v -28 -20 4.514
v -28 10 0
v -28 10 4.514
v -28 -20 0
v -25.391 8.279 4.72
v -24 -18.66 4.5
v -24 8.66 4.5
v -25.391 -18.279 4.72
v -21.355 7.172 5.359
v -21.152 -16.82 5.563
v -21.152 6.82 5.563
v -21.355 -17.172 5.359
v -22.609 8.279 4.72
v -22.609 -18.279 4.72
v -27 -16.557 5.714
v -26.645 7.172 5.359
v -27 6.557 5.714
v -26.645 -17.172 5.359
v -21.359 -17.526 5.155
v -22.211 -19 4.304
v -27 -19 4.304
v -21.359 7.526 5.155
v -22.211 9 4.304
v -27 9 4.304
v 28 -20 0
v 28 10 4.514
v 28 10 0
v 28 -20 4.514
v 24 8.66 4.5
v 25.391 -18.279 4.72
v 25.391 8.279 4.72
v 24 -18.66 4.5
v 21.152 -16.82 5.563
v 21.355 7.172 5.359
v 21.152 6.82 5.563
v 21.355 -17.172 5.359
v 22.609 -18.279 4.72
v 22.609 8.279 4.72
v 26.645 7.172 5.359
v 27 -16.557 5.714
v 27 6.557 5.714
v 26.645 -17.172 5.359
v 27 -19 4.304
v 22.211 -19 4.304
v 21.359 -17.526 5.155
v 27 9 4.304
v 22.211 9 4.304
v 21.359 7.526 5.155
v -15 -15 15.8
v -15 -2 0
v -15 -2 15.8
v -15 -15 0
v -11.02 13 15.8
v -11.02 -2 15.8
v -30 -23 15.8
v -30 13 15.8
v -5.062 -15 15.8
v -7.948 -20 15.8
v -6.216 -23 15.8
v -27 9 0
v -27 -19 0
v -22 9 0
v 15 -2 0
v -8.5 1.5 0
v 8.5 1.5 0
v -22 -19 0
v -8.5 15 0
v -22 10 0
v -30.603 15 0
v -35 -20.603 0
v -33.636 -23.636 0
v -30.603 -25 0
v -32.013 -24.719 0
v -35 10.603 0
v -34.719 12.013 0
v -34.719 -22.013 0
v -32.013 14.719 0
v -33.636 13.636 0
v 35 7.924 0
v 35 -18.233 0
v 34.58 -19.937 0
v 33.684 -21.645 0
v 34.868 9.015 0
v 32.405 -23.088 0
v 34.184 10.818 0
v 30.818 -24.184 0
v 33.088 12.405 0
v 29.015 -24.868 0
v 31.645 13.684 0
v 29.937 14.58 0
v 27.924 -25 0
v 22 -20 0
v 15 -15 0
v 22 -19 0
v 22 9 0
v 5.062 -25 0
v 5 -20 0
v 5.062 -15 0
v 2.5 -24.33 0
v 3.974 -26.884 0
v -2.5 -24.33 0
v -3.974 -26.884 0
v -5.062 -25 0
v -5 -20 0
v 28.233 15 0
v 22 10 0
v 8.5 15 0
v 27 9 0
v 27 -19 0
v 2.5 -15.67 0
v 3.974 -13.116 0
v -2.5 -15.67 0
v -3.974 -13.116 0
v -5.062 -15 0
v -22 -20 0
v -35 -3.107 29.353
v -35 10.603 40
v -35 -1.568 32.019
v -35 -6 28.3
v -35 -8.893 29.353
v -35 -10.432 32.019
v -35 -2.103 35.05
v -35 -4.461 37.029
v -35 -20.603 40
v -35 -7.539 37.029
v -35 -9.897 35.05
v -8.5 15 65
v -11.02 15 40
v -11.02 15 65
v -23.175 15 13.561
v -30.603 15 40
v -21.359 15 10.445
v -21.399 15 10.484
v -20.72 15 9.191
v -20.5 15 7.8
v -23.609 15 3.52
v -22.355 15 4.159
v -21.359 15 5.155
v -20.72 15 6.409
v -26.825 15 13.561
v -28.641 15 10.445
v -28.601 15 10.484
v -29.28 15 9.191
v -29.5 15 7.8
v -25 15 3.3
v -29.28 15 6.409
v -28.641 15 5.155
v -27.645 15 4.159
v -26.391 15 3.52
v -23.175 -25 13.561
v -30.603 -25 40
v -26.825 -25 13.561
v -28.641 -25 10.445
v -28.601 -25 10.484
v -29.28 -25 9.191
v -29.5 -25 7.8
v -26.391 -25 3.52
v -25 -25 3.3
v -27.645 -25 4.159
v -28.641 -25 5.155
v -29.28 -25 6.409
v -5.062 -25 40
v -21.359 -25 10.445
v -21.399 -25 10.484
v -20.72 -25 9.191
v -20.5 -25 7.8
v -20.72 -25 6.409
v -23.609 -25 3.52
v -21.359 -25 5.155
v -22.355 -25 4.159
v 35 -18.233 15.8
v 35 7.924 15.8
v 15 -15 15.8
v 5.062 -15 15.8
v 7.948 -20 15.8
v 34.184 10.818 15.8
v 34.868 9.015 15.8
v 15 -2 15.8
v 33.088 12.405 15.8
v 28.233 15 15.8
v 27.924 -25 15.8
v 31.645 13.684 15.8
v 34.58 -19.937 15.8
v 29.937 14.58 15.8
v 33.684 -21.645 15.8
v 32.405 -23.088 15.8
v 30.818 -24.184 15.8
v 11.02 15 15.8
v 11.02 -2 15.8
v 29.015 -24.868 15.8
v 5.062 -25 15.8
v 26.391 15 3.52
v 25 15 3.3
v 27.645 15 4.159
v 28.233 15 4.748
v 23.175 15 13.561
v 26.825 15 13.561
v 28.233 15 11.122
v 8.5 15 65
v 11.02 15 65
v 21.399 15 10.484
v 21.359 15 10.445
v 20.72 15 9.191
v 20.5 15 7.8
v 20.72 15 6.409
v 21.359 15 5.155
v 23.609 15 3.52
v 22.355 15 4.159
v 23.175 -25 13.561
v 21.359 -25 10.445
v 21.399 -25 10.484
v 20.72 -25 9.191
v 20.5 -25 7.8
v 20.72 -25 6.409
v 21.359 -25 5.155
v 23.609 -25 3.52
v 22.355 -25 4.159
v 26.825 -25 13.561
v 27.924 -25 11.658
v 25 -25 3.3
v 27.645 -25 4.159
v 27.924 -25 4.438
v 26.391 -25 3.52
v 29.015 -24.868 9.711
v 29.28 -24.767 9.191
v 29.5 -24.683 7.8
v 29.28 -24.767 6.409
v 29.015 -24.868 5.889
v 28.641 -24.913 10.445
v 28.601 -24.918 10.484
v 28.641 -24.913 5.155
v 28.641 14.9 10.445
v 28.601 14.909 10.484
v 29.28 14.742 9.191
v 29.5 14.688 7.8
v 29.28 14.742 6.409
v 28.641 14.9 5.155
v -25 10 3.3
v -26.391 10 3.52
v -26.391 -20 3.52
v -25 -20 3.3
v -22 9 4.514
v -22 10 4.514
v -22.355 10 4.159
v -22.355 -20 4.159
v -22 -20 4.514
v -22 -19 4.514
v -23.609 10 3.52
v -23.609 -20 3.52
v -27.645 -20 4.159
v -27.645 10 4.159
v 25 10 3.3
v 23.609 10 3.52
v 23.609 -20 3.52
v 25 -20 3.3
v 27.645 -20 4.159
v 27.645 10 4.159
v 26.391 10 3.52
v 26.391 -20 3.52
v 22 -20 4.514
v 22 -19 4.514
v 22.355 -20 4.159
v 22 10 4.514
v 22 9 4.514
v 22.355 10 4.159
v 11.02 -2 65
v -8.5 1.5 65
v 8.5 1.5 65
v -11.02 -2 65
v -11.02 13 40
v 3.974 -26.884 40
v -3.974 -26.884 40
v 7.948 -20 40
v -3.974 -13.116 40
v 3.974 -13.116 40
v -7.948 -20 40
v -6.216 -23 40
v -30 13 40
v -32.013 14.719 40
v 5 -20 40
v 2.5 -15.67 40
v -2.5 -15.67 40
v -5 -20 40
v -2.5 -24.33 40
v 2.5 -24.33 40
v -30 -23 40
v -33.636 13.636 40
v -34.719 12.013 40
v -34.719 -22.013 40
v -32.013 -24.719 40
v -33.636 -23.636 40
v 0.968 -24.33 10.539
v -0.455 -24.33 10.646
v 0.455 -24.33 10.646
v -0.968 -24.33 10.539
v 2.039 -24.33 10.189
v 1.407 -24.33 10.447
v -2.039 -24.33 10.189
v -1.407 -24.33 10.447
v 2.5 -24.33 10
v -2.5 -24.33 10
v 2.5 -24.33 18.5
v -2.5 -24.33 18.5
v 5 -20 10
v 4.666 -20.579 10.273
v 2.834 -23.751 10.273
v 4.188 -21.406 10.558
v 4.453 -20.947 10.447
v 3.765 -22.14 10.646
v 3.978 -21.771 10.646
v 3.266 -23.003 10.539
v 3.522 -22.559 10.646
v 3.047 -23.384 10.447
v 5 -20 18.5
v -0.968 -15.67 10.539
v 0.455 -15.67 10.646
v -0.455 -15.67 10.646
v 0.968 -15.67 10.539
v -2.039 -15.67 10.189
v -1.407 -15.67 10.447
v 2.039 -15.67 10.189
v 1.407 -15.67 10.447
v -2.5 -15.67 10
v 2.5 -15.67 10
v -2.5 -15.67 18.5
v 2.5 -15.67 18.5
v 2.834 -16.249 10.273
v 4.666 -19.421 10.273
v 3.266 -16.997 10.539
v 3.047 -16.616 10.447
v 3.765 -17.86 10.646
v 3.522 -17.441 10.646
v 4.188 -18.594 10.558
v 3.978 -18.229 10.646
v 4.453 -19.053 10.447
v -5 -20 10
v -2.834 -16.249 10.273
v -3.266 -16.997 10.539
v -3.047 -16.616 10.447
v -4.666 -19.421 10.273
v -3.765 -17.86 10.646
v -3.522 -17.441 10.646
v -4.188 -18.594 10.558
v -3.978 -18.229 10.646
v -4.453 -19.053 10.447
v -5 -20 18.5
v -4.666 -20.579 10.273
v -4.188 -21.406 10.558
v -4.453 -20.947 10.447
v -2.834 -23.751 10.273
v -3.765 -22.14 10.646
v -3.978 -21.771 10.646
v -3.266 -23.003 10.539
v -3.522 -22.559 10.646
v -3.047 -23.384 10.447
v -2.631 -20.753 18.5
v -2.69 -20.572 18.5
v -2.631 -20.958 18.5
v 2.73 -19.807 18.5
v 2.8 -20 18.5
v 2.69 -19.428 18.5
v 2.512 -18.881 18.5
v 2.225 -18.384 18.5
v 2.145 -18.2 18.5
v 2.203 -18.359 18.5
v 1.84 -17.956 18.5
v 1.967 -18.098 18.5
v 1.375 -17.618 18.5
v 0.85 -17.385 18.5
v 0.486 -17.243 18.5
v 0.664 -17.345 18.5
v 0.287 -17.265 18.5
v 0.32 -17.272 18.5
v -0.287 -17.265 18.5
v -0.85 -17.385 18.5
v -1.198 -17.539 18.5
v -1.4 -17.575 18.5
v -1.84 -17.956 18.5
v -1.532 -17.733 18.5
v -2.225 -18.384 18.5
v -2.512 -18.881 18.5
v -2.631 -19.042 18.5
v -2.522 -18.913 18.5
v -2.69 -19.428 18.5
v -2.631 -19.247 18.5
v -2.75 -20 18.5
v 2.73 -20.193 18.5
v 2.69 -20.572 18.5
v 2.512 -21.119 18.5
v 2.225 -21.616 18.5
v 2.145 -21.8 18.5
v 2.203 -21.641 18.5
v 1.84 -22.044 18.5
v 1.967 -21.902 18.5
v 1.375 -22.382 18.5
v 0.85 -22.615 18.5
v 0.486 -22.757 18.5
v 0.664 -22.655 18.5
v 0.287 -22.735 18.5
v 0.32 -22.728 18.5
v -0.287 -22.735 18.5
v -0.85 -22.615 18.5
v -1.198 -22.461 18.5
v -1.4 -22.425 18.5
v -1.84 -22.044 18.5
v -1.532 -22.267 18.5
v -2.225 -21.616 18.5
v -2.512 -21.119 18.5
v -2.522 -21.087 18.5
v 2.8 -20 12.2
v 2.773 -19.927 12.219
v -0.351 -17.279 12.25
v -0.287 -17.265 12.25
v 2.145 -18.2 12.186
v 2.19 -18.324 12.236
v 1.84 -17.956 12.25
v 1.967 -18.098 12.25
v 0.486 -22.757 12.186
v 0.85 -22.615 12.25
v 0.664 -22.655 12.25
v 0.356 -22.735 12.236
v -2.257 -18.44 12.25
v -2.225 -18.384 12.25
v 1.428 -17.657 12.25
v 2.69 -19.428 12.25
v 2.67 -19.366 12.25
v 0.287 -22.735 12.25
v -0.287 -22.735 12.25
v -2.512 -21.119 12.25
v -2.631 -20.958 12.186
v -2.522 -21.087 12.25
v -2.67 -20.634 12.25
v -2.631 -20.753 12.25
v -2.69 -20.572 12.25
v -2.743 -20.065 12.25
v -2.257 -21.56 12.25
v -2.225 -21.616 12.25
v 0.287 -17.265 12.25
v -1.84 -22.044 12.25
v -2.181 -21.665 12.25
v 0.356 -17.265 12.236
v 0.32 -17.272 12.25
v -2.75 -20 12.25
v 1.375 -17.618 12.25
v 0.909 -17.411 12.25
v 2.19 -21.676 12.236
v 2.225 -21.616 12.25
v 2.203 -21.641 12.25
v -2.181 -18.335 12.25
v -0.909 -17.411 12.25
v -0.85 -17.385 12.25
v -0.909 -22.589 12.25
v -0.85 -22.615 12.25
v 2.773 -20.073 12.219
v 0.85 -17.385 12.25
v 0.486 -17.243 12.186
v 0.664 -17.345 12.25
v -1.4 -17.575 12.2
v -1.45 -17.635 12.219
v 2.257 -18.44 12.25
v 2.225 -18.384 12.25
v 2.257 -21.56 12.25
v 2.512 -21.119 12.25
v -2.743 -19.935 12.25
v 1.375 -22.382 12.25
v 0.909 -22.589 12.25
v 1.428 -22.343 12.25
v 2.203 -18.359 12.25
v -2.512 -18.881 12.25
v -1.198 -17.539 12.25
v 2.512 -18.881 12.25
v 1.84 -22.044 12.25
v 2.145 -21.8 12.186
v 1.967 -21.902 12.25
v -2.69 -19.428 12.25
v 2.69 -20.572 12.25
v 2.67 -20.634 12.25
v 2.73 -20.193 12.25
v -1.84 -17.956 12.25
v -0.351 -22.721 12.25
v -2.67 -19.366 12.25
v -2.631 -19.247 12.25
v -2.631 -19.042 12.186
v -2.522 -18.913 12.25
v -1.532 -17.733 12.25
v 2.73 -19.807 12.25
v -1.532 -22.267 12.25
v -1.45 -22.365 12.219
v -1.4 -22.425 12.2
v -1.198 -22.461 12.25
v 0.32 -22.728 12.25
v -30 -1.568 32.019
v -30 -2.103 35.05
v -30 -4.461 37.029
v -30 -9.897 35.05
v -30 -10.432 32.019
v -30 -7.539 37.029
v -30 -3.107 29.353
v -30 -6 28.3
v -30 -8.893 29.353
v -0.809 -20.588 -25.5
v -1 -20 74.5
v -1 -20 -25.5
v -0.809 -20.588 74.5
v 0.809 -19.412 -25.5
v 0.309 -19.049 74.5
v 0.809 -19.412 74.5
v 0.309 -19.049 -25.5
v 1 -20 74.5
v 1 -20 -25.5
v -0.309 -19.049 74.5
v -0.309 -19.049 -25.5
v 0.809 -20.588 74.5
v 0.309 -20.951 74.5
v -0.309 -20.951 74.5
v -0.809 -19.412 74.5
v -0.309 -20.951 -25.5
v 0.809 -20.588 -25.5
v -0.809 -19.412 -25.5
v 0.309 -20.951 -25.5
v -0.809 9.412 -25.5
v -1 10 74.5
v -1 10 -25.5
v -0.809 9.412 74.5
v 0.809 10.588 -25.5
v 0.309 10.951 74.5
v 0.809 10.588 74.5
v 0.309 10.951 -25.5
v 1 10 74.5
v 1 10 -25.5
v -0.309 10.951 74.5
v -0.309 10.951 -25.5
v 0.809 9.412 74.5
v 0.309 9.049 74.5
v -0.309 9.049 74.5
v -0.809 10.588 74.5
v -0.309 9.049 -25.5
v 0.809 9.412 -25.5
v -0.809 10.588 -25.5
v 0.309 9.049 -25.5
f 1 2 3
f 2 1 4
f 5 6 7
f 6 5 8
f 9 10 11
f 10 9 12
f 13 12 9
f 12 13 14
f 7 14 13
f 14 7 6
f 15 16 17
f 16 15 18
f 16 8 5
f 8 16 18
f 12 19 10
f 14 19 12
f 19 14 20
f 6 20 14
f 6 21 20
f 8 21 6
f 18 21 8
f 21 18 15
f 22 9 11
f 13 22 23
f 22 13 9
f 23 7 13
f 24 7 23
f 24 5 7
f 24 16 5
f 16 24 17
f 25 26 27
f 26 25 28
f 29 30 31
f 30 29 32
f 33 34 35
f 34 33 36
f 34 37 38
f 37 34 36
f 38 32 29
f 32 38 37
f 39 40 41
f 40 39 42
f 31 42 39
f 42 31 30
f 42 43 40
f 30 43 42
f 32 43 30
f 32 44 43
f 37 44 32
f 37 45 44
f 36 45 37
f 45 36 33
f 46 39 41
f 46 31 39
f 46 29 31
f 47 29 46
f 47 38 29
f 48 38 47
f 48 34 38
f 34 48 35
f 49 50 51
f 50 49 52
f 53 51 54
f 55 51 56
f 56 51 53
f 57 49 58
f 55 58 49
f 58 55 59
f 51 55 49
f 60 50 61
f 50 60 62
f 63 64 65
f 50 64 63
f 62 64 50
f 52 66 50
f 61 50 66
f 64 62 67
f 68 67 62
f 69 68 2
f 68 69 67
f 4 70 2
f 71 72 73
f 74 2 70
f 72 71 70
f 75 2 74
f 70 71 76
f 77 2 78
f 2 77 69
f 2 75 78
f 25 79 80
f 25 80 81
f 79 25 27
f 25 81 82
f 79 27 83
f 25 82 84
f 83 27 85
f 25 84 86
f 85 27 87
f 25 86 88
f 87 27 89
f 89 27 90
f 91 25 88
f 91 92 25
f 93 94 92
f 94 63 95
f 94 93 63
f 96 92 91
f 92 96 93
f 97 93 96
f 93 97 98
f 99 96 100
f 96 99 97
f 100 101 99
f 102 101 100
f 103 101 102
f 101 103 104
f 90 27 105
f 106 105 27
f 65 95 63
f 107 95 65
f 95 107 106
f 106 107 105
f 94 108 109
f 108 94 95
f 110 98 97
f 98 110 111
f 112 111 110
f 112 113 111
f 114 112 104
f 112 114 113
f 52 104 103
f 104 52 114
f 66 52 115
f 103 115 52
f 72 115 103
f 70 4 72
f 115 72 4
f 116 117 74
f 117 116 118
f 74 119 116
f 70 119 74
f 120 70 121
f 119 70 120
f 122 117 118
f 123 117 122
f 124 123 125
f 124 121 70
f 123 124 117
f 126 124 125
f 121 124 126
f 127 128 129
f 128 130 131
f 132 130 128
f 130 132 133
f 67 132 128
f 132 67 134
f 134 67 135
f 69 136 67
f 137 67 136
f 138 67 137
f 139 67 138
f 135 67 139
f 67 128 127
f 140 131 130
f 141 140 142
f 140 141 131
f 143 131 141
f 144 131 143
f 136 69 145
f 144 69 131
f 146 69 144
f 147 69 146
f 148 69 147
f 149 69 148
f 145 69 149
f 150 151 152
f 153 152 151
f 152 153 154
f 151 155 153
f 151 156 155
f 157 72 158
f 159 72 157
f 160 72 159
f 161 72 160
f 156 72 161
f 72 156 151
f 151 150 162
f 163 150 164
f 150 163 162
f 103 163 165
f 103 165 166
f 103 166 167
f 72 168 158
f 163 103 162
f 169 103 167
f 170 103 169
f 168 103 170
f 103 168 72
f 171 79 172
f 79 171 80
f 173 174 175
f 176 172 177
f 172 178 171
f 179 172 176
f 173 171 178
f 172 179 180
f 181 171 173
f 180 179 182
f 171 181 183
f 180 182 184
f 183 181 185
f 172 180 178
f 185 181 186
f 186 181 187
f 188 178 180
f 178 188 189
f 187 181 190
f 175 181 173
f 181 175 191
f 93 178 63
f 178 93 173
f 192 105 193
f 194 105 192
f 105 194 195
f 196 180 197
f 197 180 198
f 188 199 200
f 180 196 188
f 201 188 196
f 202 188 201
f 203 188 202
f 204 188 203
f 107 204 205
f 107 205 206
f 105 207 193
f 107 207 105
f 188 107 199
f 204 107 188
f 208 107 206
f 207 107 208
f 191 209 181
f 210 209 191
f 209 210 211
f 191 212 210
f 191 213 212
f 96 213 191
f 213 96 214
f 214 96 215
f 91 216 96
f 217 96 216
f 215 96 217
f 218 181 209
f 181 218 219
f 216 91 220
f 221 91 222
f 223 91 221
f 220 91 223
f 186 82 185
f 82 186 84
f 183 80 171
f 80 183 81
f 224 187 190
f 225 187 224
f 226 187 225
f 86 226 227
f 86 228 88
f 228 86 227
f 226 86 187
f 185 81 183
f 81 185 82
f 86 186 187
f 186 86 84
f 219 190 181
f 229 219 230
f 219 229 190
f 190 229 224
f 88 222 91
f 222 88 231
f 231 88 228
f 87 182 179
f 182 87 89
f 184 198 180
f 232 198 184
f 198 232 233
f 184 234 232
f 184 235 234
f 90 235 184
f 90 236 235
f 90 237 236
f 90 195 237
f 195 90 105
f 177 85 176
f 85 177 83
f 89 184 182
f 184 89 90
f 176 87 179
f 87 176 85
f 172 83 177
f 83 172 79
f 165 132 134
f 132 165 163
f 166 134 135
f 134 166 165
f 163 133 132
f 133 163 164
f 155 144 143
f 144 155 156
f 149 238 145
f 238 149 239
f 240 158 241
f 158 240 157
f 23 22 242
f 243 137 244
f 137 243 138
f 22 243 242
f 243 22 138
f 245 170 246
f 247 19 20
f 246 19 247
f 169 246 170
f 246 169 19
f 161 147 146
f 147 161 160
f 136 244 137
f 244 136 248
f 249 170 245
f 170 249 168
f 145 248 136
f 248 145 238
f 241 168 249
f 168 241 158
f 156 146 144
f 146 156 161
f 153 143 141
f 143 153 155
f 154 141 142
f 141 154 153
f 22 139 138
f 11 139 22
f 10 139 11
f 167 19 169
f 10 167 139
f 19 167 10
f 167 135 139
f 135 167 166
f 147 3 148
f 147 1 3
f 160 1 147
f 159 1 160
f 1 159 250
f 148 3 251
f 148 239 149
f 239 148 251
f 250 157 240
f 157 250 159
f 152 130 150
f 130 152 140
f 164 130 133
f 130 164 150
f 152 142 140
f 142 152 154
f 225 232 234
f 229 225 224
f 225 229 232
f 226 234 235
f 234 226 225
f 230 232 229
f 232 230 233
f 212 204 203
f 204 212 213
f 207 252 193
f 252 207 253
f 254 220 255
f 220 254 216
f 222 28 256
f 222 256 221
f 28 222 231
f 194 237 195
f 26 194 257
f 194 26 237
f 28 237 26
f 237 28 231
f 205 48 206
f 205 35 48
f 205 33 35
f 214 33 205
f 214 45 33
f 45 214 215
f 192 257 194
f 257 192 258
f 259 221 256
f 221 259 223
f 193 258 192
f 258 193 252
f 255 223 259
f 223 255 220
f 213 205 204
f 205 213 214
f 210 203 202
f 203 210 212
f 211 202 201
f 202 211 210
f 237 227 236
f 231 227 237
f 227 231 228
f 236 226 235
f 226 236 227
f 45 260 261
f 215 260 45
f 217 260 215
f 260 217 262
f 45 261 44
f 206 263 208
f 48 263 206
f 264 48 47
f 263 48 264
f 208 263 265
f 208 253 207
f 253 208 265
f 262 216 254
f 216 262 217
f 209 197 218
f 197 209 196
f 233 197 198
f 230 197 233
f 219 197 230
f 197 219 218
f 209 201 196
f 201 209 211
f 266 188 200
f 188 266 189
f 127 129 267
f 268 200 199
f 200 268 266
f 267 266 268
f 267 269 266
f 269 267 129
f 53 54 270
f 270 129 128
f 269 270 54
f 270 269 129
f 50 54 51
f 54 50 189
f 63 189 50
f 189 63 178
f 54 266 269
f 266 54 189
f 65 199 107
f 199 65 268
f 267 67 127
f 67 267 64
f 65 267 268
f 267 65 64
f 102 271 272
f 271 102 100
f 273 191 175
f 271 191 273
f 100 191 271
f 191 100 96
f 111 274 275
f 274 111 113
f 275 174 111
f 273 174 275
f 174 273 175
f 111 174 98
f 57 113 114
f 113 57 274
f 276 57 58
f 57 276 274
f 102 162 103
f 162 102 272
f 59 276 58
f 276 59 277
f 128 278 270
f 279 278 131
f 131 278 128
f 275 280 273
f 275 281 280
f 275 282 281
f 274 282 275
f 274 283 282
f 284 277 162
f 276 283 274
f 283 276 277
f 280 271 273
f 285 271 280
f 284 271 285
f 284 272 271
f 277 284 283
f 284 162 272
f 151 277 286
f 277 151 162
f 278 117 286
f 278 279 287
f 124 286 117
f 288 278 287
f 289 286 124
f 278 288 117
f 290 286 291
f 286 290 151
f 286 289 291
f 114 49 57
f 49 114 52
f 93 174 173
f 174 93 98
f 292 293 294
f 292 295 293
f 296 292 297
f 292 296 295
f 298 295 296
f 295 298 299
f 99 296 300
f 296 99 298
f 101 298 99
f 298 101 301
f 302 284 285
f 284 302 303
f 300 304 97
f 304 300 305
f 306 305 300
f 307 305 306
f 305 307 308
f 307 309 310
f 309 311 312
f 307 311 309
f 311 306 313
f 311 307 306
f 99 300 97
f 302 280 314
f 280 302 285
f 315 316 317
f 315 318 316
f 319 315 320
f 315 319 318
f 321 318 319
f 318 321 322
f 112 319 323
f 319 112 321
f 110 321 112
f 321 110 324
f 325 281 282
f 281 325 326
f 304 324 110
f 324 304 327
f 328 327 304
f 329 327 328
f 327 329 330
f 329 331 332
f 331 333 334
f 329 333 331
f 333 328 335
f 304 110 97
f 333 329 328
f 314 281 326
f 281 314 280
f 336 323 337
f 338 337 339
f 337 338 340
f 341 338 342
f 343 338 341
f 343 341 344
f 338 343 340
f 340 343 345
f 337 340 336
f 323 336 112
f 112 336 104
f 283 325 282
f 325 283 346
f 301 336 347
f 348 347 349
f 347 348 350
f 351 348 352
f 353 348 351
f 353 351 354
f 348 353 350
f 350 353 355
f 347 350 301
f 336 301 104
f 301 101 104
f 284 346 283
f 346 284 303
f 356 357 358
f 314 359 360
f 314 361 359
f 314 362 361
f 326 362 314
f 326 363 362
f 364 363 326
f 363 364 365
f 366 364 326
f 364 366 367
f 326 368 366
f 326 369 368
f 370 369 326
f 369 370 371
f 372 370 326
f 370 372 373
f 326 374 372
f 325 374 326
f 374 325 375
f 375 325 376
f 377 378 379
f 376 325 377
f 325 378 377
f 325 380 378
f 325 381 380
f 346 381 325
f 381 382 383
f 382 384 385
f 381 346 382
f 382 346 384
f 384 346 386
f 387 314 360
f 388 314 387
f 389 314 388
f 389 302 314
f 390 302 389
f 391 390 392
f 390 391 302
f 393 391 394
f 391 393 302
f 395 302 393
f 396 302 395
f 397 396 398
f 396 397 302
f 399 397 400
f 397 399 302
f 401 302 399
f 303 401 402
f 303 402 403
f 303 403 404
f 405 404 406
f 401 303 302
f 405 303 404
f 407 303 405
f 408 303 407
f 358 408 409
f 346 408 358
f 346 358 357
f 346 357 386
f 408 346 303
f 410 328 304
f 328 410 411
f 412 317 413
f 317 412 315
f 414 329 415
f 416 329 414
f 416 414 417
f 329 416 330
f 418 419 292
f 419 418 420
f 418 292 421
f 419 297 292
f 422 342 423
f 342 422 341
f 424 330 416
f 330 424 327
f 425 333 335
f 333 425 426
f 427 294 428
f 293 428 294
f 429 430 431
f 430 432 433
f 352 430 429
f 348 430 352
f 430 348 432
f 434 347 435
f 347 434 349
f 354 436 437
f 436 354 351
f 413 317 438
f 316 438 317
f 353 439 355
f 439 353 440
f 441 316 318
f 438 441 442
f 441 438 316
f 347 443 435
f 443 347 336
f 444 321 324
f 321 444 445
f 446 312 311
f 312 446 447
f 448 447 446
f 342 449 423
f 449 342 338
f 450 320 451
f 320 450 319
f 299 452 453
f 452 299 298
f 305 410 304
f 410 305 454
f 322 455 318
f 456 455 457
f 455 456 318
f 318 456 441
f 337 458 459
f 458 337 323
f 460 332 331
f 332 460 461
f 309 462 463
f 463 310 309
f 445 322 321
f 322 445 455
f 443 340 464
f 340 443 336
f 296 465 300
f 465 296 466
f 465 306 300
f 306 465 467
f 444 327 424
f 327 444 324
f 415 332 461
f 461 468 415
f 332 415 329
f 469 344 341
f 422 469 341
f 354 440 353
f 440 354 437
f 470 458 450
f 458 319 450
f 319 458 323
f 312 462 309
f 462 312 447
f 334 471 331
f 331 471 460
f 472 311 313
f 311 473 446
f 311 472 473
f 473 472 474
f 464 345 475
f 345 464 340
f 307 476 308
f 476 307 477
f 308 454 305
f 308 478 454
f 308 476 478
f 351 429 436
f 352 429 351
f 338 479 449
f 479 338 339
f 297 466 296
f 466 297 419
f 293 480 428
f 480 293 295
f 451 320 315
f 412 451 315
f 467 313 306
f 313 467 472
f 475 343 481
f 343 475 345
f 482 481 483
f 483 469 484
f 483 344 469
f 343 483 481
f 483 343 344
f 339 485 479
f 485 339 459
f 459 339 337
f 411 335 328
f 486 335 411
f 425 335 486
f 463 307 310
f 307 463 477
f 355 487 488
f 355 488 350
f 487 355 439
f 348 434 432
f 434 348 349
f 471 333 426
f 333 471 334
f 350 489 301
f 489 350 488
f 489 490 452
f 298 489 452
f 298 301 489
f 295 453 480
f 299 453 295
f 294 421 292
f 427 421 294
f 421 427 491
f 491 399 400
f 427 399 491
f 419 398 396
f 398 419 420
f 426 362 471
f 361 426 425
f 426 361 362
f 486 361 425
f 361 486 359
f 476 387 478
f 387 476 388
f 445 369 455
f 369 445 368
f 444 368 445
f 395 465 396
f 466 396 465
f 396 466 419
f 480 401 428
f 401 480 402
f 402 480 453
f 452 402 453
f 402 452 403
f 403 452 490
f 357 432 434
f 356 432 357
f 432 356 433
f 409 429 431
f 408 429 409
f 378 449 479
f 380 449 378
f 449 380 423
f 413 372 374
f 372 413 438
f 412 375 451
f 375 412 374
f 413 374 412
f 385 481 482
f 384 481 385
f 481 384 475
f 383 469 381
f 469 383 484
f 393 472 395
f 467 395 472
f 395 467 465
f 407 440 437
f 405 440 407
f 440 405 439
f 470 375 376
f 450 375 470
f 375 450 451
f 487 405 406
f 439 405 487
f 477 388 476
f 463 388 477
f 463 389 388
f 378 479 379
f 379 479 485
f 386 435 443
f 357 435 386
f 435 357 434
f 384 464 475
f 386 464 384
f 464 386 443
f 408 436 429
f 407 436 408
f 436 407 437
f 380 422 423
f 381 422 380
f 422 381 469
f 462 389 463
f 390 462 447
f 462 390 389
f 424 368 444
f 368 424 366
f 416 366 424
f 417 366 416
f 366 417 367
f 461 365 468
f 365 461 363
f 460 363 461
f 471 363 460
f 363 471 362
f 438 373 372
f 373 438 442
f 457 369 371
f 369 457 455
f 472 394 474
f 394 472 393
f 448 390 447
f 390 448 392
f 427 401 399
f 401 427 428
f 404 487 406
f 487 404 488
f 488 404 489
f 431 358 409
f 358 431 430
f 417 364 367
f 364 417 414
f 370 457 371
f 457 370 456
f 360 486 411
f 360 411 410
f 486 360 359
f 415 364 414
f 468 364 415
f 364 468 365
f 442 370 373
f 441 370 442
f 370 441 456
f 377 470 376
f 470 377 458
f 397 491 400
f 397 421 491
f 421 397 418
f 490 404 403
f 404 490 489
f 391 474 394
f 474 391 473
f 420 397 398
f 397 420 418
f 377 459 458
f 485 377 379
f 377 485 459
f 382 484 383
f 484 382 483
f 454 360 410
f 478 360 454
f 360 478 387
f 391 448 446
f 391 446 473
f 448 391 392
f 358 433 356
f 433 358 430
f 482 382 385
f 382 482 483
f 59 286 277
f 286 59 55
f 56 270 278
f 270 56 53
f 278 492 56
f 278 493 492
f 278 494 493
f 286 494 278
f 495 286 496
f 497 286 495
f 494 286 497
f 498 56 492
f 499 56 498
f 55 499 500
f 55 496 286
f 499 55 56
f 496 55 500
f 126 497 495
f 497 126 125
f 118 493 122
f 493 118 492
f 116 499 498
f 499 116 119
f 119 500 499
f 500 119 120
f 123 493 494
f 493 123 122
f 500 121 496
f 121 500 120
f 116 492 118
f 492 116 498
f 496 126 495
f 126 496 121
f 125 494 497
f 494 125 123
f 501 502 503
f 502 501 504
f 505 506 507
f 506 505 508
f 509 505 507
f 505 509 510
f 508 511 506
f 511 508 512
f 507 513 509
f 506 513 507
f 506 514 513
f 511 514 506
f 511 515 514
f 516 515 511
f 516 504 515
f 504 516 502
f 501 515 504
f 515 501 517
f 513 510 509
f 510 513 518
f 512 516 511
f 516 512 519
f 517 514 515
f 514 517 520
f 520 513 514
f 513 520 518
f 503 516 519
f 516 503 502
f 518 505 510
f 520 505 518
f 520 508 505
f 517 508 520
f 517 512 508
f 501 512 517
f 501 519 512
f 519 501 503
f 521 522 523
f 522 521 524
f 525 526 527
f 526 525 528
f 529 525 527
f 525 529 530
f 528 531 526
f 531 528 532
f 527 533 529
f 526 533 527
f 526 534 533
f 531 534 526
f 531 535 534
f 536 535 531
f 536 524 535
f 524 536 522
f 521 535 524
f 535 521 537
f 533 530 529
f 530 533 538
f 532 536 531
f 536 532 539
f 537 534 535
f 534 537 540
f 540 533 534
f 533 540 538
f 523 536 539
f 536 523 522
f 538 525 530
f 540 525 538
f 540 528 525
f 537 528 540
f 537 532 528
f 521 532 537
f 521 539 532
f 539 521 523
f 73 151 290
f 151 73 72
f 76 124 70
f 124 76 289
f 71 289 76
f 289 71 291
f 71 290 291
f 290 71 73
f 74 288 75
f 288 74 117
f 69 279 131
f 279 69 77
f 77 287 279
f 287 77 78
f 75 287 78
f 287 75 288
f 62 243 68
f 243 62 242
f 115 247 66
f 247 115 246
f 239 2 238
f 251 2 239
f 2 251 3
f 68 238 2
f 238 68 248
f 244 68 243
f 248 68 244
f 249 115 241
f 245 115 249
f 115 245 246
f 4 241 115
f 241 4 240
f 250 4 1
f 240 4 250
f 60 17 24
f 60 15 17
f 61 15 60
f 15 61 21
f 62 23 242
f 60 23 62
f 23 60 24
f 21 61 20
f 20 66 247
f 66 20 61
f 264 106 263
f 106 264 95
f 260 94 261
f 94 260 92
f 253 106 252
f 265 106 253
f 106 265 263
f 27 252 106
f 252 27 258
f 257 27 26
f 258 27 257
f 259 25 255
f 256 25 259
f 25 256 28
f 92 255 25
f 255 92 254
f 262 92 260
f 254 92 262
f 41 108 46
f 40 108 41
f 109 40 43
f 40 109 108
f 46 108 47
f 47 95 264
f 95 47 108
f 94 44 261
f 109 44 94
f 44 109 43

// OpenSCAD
// file: configuration.scad
// PRUSA Mendel  
// Configuration file
// GNU GPL v2
// Josef Pra
// josefprusa@me.com
// prusadjs.cz
// http://www.reprap.org/wiki/Prusa_Mendel
// http://github.com/prusajr/PrusaMendel


// PLEASE SELECT ONE OF THE CONFIGURATIONS BELOW
// BY UN-COMMENTING IT


variant=0; //0 for metric
//variant=1; //1 for SAE
if(variant==0){
echo("variant: metric");
}else if(variant==1){
echo("variant: sae");
} else{
echo("WARNING: INVALID CONFIGURATION");
}




vars=[
//[m8_dia,m8_nut, m4_dia, m4_nut, m3_dia, m3_nut, bush_dia, mot_shaft, bush_rod, bush_outerdia, bush_length, m5_dia, m5_nut]
[9, 16.4, 5,9, 4.4, 7, 11, 5.3, 8, 16, 11, 5.6, 10],//metric
[9,15.7,5.5,10.6,5.5,10.6,11.5,5.3,7.9375,16,11,5.6, 10]//SAE
];


//BUSHING TYPE Can generate three versions
// 1 - regular old ones
// 2 - helical ones
// 3 - holders for brass or any other bought bushings
bushing_type = 2;


//Round corner diameter
round_corner_diameter = 8;


//Thin wall size
layer_height = 0.4;
perimeter_width_over_thicknes = 1.6;
infill_widht_over_thickness = 1.55;
thin_wall = 2*(perimeter_width_over_thicknes*layer_height+infill_widht_over_thickness*layer_height);
if(thin_wall<2){
	echo("Check thin wall size, its below 2mm!");
}
echo(thin_wall);


//DO NOT TOUCH THIS SECTION!
m8_diameter = vars[variant][0];
m8_nut_diameter = vars[variant][1];
m4_diameter = vars[variant][2];
m4_nut_diameter = vars[variant][3];
m3_diameter = vars[variant][4];
m3_nut_diameter = vars[variant][5];
bushing_diameter = vars[variant][6];
motor_shaft=vars[variant][7];
bushing_rodsize = vars[variant][8];
bushing_outerDiameter = vars[variant][9];
bushing_lenght = vars[variant][10];
m5_diameter = vars[variant][11];
m5_nut_diameter = vars[variant][12];



// MINI-HUXLEY VERSION (TODO, just place holder)
// include <configuration-huxley.scad>


// MEGA VERSION (TODO, just place holder)
// include <configuration-mega.scad>




// Some basic functions, probably should be somewhere else
module roundcorner(diameter){
	difference(){
		cube(size = [diameter,diameter,99], center = false);
		translate(v = [diameter, diameter, 0]) cylinder(h = 100, r=diameter, center=true);
	}
}
// main file
// PRUSA Mendel  
// X-end with idler mount
// GNU GPL v2
// Josef Pra
// josefprusa@me.com
// prusadjs.cz
// http://www.reprap.org/wiki/Prusa_Mendel
// http://github.com/prusajr/PrusaMendel

include <configuration.scad>
corection = 1.17; 

// Modified by Adrian to remove bridges and to add a conical cavity for the bottom nut; this
// prints more cleanly and reliably.  26 May 2011

// Modified by Adrian to use an M5 nut drive, linear bearings, and friction clamps rather than screw clamps 9 Feb 2012

/**
 *@name X end idler
 *@using 2 bushing
 *@using 1 m8spring
 *@using 2 m8nut
 */

back_clamp=[-25, -5, 0];
front_clamp=[25, -5, 0];

module clamp()
{
	translate(v = [1, 0, 9])
	difference()
	{
		translate(v = [1, 0, -3.5])cube(size = [10,29,7], center = true);
		rotate([90,0,0])cylinder(h = 38, r=m8_diameter/2, $fn=20, center=true);
		translate([-1,-15,0.5])
			rotate([30,0,0])
				cube([20,20,10],center=true);
		translate([-1,15,0.5])
			rotate([-30,0,0])
				cube([20,20,10],center=true);
	}

}

module clamp_gap()
{
	difference()
	{
		translate(v = [0, 0, 0])cube(size = [6,30,15], center = true);
		translate(v = [1, 0, 0])cube(size = [6,28,20], center = true);
	}
}


module xendidler(){
difference()
{
union()
{
translate(back_clamp)
	clamp();
translate(front_clamp)
	mirror([1,0,0])
		clamp();


difference(){
translate(v = [0,35,24.5]) 
union(){ 

difference(){
union(){
translate(v = [-25, -40, -16.6])cube(size = [20,40,15.8], center = true);
translate(v = [25, -40, -16.6])cube(size = [20,40,15.8], center = true);
}

//Friction clamps

//round corners
translate(v = [35.1, -60.1, -25]) rotate(a=[0,0,90]) roundcorner(round_corner_diameter);
translate(v = [35.1, -19.9, -25]) rotate(a=[0,0,-180]) roundcorner(round_corner_diameter);


//holes for X axis
translate(v = [-25, -18, -16.7]) rotate(a=[90,0,0]) {
	translate(v = [0, 0, 22]) cylinder(h = 42, r=4.5, $fn=20, center=true);
	translate(v = [0, 2.60, 22]) rotate(a=[0,0,0]) cylinder(h = 42, r=3.65, $fn=6, center=true);
}
translate(v = [25, -18, -16.7]) rotate(a=[90,0,0]) {
	translate(v = [0, 0, 22]) cylinder(h = 42, r=4.5, $fn=20, center=true);
	translate(v = [0, 2.60, 22]) rotate(a=[0,0,0]) cylinder(h = 42, r=3.65, $fn=6, center=true);
}
//slider cutouts
translate(v = [0, -25, 15]) 
	difference(){
	translate(v = [0, -0, -14.5])cube(size = [23,23,50], center = true);
	}
//nut trap
translate(v = [0, -55, 15]) {
	difference(){
	translate(v = [0, -0, -15])cylinder(h = 50, r=m8_nut_diameter/2+thin_wall, $fn=6, center=true);
	}
}
}

//slider
translate(v = [0, -25, 15]) 
	difference(){
union(){
	translate(v = [0, -3.5, -7]) cube(size = [17+2*thin_wall,17,65], center = true);

	translate(v = [0, -3.5, -31.6]) cube(size = [33,17,15.8], center = true);}
	translate(v = [0, -0, -7])cube(size = [17,17,70], center = true);}


translate(v = [0, -55, 0]) cylinder(h = 100, r=1, $fn=10, center=true);// Centre-marker screw drive
translate(v = [0, -25, 0]) cylinder(h = 100, r=1, $fn=10, center=true);// Centre-marker bearings

//nut trap
//correction for thin wall

translate(v = [0, -55, 15]) {
difference()
{
	union()
	{

		difference()
		{
			union()
			{
				translate(v = [0, -0, -19.5])cylinder(h = 40, r=m5_nut_diameter/2+thin_wall*corection, $fn=6, center=true);
				translate(v = [0, 0, -31.6]) cube(size = [35,10,15.8], center = true);
			}
			cylinder(h = 90, r=m5_nut_diameter/2, $fn=6, center=true);
		}

// Generate nut barrier with conical lead in under. 

		difference()
		{
			translate(v = [0, 0, -29]) cylinder(h = 16, r=m5_nut_diameter/2+thin_wall, $fn=6, center=true);
			translate(v = [0, 0, -32]) cylinder(h = 10, r1=10+2.5, r2=2.5, $fn=30, center=true);
			cylinder(h = 100, r=2.75, $fn=30, center=true);
		}


	}
	translate(v = [0, 0, 12.5]) cylinder(h = 90, r=m5_diameter/2, $fn=9, center=true);
}
}


//idler wheel connector
mirror(){
translate(v = [0, -35, -12]) difference(){
union(){
translate(v = [18, -24, 15]) cube(size = [26.5,2,25], center = true); // New web
translate(v = [21, 14, 15]) cube(size = [24,2,25], center = true); // New web
translate(v = [32.5, -5, 12.5]) cube(size = [5,40,30], center = true);
}

translate(v = [32.5, -6, 28-3-4.7]) rotate(a=[0,90,0]) cylinder(h = 90, r=m8_diameter/2, $fn=9, center=true);
//translate(v = [35.1,-25.1,-5]) rotate(a=[0,0,90]) roundcorner(3);
//translate(v = [-35.1, -19.9, -25]) rotate(a=[0,0,-90]) roundcorner(3);

}
}}

//two more rounded corners
translate(v = [-35.1,-25.1,-5]) rotate(a=[0,0,0]) roundcorner(5);
translate(v = [-35.1, +15.1, -5]) rotate(a=[0,0,-90]) roundcorner(5);
}
}

translate(back_clamp)
		clamp_gap();

translate(front_clamp)
	mirror([1,0,0])
		clamp_gap();
}
}








xendidler();
